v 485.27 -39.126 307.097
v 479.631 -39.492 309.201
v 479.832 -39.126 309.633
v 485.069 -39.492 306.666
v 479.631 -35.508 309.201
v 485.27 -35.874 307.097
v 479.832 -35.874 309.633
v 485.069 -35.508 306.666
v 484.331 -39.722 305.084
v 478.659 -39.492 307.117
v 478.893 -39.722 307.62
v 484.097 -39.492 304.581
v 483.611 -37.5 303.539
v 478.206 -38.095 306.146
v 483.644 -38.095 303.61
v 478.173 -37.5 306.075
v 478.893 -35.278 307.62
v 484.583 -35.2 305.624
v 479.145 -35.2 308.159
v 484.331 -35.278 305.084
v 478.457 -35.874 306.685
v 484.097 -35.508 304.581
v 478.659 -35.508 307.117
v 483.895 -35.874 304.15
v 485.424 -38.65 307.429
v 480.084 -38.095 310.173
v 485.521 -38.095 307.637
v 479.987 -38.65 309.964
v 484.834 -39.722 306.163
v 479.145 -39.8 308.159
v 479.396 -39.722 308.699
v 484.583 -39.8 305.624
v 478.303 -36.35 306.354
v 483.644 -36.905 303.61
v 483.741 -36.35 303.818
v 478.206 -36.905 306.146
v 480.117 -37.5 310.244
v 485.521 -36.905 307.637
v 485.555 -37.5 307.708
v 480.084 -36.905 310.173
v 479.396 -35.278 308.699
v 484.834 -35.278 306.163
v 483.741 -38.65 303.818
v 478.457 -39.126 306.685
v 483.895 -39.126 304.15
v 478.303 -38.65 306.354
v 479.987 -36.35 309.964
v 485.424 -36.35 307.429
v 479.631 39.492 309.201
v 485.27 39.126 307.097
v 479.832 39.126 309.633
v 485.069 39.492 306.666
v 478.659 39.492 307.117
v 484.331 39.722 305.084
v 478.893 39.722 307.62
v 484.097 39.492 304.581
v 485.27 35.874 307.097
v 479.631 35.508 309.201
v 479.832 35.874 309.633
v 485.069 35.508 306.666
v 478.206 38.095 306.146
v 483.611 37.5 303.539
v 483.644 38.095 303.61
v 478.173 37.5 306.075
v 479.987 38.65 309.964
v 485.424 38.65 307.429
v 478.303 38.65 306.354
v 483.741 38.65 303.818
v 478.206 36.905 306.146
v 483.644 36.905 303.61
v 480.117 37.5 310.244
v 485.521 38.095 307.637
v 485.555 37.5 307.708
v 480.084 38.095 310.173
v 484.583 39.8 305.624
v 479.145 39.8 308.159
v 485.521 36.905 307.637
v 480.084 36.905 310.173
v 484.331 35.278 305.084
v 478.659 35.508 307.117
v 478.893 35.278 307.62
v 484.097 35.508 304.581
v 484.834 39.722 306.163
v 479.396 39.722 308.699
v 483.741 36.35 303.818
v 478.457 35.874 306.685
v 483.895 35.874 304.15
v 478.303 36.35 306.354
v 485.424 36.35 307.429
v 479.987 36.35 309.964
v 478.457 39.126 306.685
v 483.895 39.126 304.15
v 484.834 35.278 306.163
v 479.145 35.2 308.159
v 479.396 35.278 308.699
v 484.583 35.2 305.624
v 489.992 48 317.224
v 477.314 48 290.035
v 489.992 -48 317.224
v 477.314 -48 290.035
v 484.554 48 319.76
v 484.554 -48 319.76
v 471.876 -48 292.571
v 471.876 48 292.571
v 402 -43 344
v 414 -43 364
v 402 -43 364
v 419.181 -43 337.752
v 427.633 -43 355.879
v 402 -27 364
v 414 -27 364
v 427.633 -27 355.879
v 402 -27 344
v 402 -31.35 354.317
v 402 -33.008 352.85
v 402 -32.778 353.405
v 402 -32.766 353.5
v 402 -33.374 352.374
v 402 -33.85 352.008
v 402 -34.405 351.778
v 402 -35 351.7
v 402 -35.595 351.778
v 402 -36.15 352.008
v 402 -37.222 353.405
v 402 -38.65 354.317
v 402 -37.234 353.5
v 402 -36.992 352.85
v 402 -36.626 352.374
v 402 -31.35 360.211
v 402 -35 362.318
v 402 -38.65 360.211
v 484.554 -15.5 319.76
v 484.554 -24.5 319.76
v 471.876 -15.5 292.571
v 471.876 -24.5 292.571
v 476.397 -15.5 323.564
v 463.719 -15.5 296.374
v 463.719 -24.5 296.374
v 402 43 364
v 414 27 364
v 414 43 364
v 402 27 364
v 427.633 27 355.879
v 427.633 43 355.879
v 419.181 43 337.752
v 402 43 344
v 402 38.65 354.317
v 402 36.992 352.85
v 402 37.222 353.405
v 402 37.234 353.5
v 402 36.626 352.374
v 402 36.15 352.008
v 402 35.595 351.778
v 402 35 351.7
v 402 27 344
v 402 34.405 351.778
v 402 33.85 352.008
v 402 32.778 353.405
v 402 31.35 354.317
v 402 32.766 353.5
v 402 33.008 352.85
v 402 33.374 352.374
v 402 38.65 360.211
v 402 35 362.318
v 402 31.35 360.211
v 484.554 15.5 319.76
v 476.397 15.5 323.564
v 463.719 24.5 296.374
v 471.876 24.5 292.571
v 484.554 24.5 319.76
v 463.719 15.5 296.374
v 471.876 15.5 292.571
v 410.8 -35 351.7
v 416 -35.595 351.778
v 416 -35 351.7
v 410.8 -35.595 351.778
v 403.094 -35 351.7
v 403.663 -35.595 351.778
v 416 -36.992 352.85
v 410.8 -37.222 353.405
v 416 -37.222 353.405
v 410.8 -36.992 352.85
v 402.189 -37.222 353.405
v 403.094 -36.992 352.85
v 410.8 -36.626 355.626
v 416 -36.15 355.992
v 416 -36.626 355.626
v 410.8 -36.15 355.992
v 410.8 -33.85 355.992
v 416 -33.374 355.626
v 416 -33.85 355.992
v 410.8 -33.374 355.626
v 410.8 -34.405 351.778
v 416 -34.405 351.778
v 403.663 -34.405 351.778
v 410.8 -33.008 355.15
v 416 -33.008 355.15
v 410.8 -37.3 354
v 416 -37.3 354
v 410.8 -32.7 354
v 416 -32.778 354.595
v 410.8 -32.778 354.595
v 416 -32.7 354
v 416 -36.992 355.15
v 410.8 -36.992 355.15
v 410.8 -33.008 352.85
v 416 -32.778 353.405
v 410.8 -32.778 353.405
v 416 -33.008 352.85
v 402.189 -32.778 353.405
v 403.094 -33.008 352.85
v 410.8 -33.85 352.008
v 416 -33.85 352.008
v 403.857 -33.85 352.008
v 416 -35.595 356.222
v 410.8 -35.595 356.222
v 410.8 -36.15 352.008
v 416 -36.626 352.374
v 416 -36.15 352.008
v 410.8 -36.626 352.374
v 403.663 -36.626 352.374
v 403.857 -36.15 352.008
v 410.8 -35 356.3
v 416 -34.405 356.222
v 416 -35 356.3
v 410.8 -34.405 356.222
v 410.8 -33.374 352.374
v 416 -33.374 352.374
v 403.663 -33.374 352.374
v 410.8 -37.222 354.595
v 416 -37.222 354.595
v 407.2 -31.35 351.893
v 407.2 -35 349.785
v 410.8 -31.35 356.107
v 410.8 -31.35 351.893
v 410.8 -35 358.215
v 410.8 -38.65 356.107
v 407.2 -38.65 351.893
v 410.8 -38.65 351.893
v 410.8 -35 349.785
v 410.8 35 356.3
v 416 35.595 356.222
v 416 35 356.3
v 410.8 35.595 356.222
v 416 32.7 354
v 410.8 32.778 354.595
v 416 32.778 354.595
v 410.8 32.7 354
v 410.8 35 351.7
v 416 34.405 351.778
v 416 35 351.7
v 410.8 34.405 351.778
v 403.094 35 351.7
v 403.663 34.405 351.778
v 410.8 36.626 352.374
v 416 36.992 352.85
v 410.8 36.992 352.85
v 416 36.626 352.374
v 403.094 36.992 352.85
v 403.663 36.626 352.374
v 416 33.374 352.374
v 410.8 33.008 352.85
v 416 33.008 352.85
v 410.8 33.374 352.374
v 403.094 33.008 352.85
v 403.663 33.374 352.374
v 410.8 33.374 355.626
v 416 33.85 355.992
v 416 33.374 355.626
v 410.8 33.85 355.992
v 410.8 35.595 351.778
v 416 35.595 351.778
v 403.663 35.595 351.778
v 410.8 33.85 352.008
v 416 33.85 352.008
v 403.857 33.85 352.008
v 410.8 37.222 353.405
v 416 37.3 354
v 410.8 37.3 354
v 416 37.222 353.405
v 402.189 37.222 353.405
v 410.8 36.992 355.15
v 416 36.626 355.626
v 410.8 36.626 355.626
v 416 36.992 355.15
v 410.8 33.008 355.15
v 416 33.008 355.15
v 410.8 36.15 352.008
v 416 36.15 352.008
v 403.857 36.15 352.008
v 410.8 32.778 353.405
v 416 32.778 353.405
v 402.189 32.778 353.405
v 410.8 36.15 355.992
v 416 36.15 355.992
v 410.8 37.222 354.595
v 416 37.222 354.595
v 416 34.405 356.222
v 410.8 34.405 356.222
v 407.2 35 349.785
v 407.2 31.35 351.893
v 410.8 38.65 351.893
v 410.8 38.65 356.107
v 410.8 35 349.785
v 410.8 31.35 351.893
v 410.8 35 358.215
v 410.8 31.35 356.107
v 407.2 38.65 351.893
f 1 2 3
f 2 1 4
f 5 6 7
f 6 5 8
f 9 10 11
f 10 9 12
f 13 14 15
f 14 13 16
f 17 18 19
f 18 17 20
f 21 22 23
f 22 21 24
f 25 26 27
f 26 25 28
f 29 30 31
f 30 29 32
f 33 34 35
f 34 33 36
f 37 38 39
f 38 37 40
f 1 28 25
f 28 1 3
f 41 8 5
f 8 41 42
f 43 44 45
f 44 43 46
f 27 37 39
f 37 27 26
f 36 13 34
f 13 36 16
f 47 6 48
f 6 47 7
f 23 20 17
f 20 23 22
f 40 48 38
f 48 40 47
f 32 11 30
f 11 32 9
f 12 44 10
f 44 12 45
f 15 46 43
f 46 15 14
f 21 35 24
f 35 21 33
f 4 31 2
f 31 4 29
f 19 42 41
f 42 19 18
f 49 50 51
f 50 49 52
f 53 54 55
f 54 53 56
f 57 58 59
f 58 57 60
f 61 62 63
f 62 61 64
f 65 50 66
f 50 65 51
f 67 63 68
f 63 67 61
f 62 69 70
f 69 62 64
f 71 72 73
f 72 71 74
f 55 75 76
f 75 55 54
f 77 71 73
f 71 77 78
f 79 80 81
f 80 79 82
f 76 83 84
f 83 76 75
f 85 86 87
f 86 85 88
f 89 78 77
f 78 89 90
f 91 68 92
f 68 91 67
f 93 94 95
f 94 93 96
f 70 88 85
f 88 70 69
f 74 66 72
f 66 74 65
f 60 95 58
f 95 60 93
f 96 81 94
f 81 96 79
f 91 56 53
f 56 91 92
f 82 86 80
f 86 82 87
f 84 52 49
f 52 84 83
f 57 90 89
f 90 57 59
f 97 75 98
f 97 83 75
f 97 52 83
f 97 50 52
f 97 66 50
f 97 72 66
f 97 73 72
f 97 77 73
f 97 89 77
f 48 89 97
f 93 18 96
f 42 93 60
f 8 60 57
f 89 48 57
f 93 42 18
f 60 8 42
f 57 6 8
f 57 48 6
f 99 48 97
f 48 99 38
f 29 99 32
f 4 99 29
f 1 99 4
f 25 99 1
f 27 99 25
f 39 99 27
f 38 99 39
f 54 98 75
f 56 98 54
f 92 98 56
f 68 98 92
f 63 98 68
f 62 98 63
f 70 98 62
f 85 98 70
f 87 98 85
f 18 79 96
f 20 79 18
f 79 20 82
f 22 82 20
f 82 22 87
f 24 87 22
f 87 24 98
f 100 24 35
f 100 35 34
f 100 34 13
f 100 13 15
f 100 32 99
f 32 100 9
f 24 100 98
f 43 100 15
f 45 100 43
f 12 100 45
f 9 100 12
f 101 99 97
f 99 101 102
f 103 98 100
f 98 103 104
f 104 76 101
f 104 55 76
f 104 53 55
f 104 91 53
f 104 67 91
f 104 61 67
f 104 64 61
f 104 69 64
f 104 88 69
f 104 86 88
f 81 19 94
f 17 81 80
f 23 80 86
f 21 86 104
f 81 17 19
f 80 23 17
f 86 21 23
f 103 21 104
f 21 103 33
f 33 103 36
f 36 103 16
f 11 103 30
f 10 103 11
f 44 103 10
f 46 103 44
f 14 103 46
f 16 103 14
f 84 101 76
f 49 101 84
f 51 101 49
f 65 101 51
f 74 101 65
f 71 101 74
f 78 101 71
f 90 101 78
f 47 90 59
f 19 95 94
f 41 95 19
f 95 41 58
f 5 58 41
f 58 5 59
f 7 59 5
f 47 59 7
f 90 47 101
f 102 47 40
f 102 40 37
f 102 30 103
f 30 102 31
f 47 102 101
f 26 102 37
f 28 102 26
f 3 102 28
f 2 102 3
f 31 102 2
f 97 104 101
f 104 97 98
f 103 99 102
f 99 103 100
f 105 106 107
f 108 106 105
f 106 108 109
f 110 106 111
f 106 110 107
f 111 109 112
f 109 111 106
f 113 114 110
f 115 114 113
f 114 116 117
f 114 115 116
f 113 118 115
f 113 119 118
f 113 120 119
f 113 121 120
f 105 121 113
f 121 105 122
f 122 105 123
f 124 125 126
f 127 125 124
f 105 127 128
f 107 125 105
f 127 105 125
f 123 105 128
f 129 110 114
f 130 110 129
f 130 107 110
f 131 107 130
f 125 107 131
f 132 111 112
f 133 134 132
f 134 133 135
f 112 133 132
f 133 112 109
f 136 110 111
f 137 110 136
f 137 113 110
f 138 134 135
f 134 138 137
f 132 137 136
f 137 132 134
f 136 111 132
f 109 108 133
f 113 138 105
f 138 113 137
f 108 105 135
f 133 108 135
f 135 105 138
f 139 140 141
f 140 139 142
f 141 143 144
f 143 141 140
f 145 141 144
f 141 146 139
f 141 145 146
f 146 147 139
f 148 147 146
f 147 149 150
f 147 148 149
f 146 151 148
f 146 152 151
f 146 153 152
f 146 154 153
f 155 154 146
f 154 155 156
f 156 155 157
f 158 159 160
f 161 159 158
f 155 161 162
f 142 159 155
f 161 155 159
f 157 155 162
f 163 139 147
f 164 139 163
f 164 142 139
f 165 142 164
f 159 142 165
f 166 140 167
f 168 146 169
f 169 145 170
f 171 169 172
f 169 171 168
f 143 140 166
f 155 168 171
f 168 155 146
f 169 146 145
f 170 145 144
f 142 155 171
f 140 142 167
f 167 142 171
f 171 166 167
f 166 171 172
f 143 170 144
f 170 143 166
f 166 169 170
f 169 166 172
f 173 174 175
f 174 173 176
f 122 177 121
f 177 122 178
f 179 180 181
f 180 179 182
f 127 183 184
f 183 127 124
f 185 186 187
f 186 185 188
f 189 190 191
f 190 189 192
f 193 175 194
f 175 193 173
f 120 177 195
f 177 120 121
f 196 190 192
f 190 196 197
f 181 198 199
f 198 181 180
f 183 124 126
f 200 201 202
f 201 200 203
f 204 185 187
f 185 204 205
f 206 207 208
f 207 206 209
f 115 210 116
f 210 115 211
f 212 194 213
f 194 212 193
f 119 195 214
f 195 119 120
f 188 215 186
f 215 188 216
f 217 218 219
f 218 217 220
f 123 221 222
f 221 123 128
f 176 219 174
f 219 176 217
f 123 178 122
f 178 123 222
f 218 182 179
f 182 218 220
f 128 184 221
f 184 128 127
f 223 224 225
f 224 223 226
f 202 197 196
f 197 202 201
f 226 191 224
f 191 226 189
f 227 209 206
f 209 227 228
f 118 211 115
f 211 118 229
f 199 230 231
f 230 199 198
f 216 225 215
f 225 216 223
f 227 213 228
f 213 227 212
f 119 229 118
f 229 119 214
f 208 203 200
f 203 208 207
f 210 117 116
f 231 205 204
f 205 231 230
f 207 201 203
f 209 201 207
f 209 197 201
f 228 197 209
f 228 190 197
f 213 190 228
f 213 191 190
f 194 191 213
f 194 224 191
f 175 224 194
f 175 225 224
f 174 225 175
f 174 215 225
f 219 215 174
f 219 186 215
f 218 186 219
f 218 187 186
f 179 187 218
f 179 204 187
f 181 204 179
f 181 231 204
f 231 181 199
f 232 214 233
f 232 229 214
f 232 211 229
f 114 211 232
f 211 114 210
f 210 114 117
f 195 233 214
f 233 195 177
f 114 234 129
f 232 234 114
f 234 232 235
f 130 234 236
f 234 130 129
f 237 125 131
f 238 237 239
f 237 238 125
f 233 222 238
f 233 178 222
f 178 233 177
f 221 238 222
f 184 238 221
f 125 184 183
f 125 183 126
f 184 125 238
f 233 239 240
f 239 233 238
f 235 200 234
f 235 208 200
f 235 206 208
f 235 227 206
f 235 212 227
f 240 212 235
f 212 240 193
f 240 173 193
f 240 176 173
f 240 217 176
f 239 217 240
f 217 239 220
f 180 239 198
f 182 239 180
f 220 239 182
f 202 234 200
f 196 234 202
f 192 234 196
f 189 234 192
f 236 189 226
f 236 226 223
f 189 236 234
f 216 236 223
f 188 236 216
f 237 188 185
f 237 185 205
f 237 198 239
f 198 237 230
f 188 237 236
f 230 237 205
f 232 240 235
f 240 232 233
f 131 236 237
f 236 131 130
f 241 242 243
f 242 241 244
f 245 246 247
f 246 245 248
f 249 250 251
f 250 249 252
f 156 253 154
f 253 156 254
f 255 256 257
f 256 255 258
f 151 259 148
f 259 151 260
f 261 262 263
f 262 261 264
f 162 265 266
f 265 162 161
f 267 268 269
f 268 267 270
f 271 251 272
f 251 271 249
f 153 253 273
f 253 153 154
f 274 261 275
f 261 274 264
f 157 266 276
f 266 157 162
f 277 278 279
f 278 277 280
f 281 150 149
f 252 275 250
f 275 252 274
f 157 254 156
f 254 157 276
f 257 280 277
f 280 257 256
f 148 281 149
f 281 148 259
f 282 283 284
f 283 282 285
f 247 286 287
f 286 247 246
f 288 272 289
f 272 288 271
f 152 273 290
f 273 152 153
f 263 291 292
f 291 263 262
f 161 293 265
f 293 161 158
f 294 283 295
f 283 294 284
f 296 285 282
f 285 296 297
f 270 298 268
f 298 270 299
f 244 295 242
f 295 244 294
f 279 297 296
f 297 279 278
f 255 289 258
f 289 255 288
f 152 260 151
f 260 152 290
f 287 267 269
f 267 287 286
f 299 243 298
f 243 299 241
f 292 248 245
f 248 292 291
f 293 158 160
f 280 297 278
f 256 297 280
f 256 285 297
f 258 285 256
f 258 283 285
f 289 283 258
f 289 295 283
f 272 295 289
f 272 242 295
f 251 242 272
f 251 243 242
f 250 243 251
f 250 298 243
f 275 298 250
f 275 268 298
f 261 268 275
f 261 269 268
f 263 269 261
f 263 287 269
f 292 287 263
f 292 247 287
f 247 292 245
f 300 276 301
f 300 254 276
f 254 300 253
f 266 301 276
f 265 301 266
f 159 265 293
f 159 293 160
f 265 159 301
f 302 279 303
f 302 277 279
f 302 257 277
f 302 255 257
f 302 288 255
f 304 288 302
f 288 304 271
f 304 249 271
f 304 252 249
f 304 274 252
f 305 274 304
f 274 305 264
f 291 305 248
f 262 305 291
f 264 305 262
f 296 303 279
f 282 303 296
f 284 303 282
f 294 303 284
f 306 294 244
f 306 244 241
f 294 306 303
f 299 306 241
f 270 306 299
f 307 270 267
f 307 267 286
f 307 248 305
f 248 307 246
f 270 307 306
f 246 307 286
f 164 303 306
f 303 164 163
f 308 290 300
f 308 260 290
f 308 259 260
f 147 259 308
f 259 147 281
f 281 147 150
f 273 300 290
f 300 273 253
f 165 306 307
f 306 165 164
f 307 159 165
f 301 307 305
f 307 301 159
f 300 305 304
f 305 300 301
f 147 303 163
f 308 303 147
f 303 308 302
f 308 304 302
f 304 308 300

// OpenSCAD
// file: p299e-oak-s2.scad
// P2-99e: OAK-D S2 envelope, mounting interface and installed pose.
// Shared by the arch bracket (p299e-oak-bracket.scad) and the body-F camera
// eye (body-panels-f.scad) so the two can never drift apart. Use with
// `include`; no top-level geometry.
//
// Source: official Luxonis enclosure STEP DM9098S2_enclosure.stp
// (https://oak-files.fra1.cdn.digitaloceanspaces.com/OAK-D-S2/DM9098S2_enclosure.stp,
// linked from github.com/luxonis/oak-hardware DM9098_OAK-D-S2/Mechanical;
// STEP FILE_NAME 010-00009-02_ASM 2022-06-03, HTTP Last-Modified 2023-05-11,
// sha256 bedf072b...85cdf) and datasheet OAK-D-S2_Datasheet.pdf (Dec 2021):
//   enclosure 97.1 x 29.7 x 23.4 mm (datasheet 97 x 29.5 x 22.9),
//   three lenses on one line 19.67 mm above the bottom (datasheet 19.51),
//   RGB centred, stereo at +-37.5 mm (75 mm baseline),
//   back: 2 x M4 (tap drill D3.3, datasheet "M4 depth 8") at +-37.5 mm,
//         14.87 mm above the bottom = 4.8 mm below the lens axis,
//   bottom: 1/4"-20 (minor D5.1) under one stereo lens, 6.2 mm from the back.
// Mass: NOT stated in the datasheet/docs -> to be weighed by the user.
//
// Camera-local frame: origin = RGB lens centre on the front face,
// +X = optical axis, +Y = left, +Z = up (enclosure top).

oak_lens = [508, 0, 300];      // CAD mm, approved P2-99e position B
oak_pitch_deg = 25;            // approved default, downward
oak_size = [23.4, 97.1, 29.7]; // depth (X), width (Y), height (Z)
oak_lens_above_bottom = 19.67;
oak_m4_y = 37.5;
oak_m4_below_axis = 4.8;

module oak_frame(pitch=oak_pitch_deg) {
  translate(oak_lens) rotate([0, pitch, 0]) children();
}

// Enclosure envelope, optionally grown by `pad` on every side.
module oak_s2_envelope(pad=0, pitch=oak_pitch_deg) {
  oak_frame(pitch)
    translate([-oak_size[0] - pad, -oak_size[1] / 2 - pad, -oak_lens_above_bottom - pad])
      cube([oak_size[0] + 2 * pad, oak_size[1] + 2 * pad, oak_size[2] + 2 * pad]);
}

// Union of the RGB (69 x 55 deg) and stereo (80 x 55 deg) fields of view as a
// pyramid from the lens, `len` mm long (camera eye / keep-out use).
module oak_fov(len=80, pitch=oak_pitch_deg) {
  oak_frame(pitch) hull() {
    translate([0.5, 0, 0]) cube([1, 2 * oak_m4_y + 10, 10], center=true);  // all three lenses
    for (sy = [-1, 1], sz = [-1, 1])
      translate([len, sy * len * tan(40), sz * len * tan(27.5)]) cube(1, center=true);
  }
}
// main file
// P2-99e: OAK-D S2 bracket from the P2-93 upper (LiDAR) beam, position B.
// Replaces p293d_oak_mount (50 deg plate at X450). Reuses the existing two
// M4 X-axis bores of the beam at [*, +-35, 354] (pads butt at X402) - no new
// hole in the chassis or the arch. Through-bolt M4 x 40 from behind the beam
// into a captive nut in each pad (project rule: load-path M4 = bolt + nut). Back plate perpendicular to the optical
// axis takes the camera's two VESA M4 (75 mm) from behind (M4 x 12, 6 mm
// plate + ~6 mm thread engagement of the 8 mm camera bores).
// Stiffness: per side one solid triangular web from the pad to the upper and
// lower plate nodes (9 mm thick, depth = full plate height at the plate),
// tapered inward in plan; the beam ties the pads, the plate ties the webs.
// Print: plate face on the bed, struts vertical (export pose below).
include <p299e-oak-s2.scad>

m4d = 4.6;
plate_t = 6;
plate_w = 96;            // along camera Y
plate_z = [-22, 8];      // camera-local Z range (lens axis at 0)
strut = 9;               // square strut section, mm
strut_y = 20;            // strut landing on the plate, +-Y
pad_c = [406, 35, 354];  // existing beam bore axis (p293d xhole), +-Y
pad = [12, 16, 20];      // pad block: contact face on the beam front X402
pad_x = 402 + 12 / 2;    // pad centre X

seat_gap = 0.2;          // nominal CAD clearance camera back <-> plate, closed by the M4 clamp
function plate_x() = -oak_size[0] - seat_gap - plate_t;   // camera-local X of the plate back face

module p299e_plate() {
  oak_frame() difference() {
    translate([plate_x(), -plate_w / 2, plate_z[0]])
      cube([plate_t, plate_w, plate_z[1] - plate_z[0]]);
    for (s = [-1, 1]) translate([0, s * oak_m4_y, -oak_m4_below_axis])
      rotate([0, 90, 0]) cylinder(d=m4d, h=200, center=true, $fn=24);
  }
}

module plate_node(s, z) {   // strut foot on the plate back face (camera frame)
  oak_frame() translate([plate_x() - strut / 2, s * strut_y, z]) cube(strut, center=true);
}

// Pad centre in the camera frame (inverse of oak_frame()).
function pad_cam(s) = let(dx = pad_x - oak_lens[0], dz = pad_c[2] - oak_lens[2], p = oak_pitch_deg)
  [dx * cos(p) - dz * sin(p), s * pad_c[1], dx * sin(p) + dz * cos(p)];

// Pad block hulled to a print-frame-aligned foot 16 mm toward the plate, so
// the 25 deg tilted pad does not start printing from a hanging corner.
module pad_block(s) {
  hull() {
    translate([pad_x, s * pad_c[1], pad_c[2]]) cube(pad, center=true);
    oak_frame() translate(pad_cam(s) + [16, 0, 0]) cube([2, pad[1], pad[2]], center=true);
  }
}

module pad_node(s) { translate([pad_x, s * pad_c[1], pad_c[2]]) cube(strut, center=true); }

module p299e_oak_bracket() {
  difference() {
    union() {
      p299e_plate();
      for (s = [-1, 1]) {
        pad_block(s);
        // one solid triangular web per side: pad + upper + lower plate node
        hull() { pad_block(s); plate_node(s, plate_z[1] - strut / 2); plate_node(s, plate_z[0] + strut / 2); }
      }
    }
    for (s = [-1, 1]) {
      // M4 x 40 from behind the beam (X~378): bore through beam side and pad,
      // blind at X416 so it does not break out of the tilted web.
      translate([396, s * pad_c[1], pad_c[2]])
        rotate([0, 90, 0]) cylinder(d=m4d, h=40, center=true, $fn=24);
      // captive M4 nut (AF7 + 0.3) at X409. The pocket is swept along the
      // print-vertical direction (camera -X) out through the pad face that
      // butts on the beam, so it has vertical walls in the print pose; the
      // nut drops in before the pad is bolted to the beam.
      hull() for (t = [0, 30])
        translate([409, s * pad_c[1], pad_c[2]])
          translate(t * [-cos(oak_pitch_deg), 0, sin(oak_pitch_deg)]) rotate([0, 90, 0])
            cylinder(d=(7 + 0.3) / cos(30), h=3.6, center=true, $fn=6);
    }
    // the camera's own envelope is never cut by the bracket
    oak_s2_envelope();
  }
}

// Hex-key (L) access for the two camera M4 from behind the plate: a clear
// D10 x 25 mm cylinder on each bolt axis must not intersect the bracket.
// (A 70 mm straight screwdriver path is NOT available: the struts converge
// to the pads at Y+-35 and cross it.)
module p299e_tool_access() {
  oak_frame() for (s = [-1, 1])
    translate([plate_x() - 25, s * oak_m4_y, -oak_m4_below_axis])
      rotate([0, 90, 0]) cylinder(d=10, h=25, $fn=24);
}

part = "assembly";
if (part == "assembly") p299e_oak_bracket();
else if (part == "qa_tool") intersection() { p299e_oak_bracket(); p299e_tool_access(); }
// print pose: plate back face on the bed, webs up
else if (part == "p299e_oak_bracket")
  rotate([0, 90, 0]) translate(-[plate_x() + plate_t, 0, 0])
    rotate([0, -oak_pitch_deg, 0]) translate(-oak_lens) p299e_oak_bracket();
